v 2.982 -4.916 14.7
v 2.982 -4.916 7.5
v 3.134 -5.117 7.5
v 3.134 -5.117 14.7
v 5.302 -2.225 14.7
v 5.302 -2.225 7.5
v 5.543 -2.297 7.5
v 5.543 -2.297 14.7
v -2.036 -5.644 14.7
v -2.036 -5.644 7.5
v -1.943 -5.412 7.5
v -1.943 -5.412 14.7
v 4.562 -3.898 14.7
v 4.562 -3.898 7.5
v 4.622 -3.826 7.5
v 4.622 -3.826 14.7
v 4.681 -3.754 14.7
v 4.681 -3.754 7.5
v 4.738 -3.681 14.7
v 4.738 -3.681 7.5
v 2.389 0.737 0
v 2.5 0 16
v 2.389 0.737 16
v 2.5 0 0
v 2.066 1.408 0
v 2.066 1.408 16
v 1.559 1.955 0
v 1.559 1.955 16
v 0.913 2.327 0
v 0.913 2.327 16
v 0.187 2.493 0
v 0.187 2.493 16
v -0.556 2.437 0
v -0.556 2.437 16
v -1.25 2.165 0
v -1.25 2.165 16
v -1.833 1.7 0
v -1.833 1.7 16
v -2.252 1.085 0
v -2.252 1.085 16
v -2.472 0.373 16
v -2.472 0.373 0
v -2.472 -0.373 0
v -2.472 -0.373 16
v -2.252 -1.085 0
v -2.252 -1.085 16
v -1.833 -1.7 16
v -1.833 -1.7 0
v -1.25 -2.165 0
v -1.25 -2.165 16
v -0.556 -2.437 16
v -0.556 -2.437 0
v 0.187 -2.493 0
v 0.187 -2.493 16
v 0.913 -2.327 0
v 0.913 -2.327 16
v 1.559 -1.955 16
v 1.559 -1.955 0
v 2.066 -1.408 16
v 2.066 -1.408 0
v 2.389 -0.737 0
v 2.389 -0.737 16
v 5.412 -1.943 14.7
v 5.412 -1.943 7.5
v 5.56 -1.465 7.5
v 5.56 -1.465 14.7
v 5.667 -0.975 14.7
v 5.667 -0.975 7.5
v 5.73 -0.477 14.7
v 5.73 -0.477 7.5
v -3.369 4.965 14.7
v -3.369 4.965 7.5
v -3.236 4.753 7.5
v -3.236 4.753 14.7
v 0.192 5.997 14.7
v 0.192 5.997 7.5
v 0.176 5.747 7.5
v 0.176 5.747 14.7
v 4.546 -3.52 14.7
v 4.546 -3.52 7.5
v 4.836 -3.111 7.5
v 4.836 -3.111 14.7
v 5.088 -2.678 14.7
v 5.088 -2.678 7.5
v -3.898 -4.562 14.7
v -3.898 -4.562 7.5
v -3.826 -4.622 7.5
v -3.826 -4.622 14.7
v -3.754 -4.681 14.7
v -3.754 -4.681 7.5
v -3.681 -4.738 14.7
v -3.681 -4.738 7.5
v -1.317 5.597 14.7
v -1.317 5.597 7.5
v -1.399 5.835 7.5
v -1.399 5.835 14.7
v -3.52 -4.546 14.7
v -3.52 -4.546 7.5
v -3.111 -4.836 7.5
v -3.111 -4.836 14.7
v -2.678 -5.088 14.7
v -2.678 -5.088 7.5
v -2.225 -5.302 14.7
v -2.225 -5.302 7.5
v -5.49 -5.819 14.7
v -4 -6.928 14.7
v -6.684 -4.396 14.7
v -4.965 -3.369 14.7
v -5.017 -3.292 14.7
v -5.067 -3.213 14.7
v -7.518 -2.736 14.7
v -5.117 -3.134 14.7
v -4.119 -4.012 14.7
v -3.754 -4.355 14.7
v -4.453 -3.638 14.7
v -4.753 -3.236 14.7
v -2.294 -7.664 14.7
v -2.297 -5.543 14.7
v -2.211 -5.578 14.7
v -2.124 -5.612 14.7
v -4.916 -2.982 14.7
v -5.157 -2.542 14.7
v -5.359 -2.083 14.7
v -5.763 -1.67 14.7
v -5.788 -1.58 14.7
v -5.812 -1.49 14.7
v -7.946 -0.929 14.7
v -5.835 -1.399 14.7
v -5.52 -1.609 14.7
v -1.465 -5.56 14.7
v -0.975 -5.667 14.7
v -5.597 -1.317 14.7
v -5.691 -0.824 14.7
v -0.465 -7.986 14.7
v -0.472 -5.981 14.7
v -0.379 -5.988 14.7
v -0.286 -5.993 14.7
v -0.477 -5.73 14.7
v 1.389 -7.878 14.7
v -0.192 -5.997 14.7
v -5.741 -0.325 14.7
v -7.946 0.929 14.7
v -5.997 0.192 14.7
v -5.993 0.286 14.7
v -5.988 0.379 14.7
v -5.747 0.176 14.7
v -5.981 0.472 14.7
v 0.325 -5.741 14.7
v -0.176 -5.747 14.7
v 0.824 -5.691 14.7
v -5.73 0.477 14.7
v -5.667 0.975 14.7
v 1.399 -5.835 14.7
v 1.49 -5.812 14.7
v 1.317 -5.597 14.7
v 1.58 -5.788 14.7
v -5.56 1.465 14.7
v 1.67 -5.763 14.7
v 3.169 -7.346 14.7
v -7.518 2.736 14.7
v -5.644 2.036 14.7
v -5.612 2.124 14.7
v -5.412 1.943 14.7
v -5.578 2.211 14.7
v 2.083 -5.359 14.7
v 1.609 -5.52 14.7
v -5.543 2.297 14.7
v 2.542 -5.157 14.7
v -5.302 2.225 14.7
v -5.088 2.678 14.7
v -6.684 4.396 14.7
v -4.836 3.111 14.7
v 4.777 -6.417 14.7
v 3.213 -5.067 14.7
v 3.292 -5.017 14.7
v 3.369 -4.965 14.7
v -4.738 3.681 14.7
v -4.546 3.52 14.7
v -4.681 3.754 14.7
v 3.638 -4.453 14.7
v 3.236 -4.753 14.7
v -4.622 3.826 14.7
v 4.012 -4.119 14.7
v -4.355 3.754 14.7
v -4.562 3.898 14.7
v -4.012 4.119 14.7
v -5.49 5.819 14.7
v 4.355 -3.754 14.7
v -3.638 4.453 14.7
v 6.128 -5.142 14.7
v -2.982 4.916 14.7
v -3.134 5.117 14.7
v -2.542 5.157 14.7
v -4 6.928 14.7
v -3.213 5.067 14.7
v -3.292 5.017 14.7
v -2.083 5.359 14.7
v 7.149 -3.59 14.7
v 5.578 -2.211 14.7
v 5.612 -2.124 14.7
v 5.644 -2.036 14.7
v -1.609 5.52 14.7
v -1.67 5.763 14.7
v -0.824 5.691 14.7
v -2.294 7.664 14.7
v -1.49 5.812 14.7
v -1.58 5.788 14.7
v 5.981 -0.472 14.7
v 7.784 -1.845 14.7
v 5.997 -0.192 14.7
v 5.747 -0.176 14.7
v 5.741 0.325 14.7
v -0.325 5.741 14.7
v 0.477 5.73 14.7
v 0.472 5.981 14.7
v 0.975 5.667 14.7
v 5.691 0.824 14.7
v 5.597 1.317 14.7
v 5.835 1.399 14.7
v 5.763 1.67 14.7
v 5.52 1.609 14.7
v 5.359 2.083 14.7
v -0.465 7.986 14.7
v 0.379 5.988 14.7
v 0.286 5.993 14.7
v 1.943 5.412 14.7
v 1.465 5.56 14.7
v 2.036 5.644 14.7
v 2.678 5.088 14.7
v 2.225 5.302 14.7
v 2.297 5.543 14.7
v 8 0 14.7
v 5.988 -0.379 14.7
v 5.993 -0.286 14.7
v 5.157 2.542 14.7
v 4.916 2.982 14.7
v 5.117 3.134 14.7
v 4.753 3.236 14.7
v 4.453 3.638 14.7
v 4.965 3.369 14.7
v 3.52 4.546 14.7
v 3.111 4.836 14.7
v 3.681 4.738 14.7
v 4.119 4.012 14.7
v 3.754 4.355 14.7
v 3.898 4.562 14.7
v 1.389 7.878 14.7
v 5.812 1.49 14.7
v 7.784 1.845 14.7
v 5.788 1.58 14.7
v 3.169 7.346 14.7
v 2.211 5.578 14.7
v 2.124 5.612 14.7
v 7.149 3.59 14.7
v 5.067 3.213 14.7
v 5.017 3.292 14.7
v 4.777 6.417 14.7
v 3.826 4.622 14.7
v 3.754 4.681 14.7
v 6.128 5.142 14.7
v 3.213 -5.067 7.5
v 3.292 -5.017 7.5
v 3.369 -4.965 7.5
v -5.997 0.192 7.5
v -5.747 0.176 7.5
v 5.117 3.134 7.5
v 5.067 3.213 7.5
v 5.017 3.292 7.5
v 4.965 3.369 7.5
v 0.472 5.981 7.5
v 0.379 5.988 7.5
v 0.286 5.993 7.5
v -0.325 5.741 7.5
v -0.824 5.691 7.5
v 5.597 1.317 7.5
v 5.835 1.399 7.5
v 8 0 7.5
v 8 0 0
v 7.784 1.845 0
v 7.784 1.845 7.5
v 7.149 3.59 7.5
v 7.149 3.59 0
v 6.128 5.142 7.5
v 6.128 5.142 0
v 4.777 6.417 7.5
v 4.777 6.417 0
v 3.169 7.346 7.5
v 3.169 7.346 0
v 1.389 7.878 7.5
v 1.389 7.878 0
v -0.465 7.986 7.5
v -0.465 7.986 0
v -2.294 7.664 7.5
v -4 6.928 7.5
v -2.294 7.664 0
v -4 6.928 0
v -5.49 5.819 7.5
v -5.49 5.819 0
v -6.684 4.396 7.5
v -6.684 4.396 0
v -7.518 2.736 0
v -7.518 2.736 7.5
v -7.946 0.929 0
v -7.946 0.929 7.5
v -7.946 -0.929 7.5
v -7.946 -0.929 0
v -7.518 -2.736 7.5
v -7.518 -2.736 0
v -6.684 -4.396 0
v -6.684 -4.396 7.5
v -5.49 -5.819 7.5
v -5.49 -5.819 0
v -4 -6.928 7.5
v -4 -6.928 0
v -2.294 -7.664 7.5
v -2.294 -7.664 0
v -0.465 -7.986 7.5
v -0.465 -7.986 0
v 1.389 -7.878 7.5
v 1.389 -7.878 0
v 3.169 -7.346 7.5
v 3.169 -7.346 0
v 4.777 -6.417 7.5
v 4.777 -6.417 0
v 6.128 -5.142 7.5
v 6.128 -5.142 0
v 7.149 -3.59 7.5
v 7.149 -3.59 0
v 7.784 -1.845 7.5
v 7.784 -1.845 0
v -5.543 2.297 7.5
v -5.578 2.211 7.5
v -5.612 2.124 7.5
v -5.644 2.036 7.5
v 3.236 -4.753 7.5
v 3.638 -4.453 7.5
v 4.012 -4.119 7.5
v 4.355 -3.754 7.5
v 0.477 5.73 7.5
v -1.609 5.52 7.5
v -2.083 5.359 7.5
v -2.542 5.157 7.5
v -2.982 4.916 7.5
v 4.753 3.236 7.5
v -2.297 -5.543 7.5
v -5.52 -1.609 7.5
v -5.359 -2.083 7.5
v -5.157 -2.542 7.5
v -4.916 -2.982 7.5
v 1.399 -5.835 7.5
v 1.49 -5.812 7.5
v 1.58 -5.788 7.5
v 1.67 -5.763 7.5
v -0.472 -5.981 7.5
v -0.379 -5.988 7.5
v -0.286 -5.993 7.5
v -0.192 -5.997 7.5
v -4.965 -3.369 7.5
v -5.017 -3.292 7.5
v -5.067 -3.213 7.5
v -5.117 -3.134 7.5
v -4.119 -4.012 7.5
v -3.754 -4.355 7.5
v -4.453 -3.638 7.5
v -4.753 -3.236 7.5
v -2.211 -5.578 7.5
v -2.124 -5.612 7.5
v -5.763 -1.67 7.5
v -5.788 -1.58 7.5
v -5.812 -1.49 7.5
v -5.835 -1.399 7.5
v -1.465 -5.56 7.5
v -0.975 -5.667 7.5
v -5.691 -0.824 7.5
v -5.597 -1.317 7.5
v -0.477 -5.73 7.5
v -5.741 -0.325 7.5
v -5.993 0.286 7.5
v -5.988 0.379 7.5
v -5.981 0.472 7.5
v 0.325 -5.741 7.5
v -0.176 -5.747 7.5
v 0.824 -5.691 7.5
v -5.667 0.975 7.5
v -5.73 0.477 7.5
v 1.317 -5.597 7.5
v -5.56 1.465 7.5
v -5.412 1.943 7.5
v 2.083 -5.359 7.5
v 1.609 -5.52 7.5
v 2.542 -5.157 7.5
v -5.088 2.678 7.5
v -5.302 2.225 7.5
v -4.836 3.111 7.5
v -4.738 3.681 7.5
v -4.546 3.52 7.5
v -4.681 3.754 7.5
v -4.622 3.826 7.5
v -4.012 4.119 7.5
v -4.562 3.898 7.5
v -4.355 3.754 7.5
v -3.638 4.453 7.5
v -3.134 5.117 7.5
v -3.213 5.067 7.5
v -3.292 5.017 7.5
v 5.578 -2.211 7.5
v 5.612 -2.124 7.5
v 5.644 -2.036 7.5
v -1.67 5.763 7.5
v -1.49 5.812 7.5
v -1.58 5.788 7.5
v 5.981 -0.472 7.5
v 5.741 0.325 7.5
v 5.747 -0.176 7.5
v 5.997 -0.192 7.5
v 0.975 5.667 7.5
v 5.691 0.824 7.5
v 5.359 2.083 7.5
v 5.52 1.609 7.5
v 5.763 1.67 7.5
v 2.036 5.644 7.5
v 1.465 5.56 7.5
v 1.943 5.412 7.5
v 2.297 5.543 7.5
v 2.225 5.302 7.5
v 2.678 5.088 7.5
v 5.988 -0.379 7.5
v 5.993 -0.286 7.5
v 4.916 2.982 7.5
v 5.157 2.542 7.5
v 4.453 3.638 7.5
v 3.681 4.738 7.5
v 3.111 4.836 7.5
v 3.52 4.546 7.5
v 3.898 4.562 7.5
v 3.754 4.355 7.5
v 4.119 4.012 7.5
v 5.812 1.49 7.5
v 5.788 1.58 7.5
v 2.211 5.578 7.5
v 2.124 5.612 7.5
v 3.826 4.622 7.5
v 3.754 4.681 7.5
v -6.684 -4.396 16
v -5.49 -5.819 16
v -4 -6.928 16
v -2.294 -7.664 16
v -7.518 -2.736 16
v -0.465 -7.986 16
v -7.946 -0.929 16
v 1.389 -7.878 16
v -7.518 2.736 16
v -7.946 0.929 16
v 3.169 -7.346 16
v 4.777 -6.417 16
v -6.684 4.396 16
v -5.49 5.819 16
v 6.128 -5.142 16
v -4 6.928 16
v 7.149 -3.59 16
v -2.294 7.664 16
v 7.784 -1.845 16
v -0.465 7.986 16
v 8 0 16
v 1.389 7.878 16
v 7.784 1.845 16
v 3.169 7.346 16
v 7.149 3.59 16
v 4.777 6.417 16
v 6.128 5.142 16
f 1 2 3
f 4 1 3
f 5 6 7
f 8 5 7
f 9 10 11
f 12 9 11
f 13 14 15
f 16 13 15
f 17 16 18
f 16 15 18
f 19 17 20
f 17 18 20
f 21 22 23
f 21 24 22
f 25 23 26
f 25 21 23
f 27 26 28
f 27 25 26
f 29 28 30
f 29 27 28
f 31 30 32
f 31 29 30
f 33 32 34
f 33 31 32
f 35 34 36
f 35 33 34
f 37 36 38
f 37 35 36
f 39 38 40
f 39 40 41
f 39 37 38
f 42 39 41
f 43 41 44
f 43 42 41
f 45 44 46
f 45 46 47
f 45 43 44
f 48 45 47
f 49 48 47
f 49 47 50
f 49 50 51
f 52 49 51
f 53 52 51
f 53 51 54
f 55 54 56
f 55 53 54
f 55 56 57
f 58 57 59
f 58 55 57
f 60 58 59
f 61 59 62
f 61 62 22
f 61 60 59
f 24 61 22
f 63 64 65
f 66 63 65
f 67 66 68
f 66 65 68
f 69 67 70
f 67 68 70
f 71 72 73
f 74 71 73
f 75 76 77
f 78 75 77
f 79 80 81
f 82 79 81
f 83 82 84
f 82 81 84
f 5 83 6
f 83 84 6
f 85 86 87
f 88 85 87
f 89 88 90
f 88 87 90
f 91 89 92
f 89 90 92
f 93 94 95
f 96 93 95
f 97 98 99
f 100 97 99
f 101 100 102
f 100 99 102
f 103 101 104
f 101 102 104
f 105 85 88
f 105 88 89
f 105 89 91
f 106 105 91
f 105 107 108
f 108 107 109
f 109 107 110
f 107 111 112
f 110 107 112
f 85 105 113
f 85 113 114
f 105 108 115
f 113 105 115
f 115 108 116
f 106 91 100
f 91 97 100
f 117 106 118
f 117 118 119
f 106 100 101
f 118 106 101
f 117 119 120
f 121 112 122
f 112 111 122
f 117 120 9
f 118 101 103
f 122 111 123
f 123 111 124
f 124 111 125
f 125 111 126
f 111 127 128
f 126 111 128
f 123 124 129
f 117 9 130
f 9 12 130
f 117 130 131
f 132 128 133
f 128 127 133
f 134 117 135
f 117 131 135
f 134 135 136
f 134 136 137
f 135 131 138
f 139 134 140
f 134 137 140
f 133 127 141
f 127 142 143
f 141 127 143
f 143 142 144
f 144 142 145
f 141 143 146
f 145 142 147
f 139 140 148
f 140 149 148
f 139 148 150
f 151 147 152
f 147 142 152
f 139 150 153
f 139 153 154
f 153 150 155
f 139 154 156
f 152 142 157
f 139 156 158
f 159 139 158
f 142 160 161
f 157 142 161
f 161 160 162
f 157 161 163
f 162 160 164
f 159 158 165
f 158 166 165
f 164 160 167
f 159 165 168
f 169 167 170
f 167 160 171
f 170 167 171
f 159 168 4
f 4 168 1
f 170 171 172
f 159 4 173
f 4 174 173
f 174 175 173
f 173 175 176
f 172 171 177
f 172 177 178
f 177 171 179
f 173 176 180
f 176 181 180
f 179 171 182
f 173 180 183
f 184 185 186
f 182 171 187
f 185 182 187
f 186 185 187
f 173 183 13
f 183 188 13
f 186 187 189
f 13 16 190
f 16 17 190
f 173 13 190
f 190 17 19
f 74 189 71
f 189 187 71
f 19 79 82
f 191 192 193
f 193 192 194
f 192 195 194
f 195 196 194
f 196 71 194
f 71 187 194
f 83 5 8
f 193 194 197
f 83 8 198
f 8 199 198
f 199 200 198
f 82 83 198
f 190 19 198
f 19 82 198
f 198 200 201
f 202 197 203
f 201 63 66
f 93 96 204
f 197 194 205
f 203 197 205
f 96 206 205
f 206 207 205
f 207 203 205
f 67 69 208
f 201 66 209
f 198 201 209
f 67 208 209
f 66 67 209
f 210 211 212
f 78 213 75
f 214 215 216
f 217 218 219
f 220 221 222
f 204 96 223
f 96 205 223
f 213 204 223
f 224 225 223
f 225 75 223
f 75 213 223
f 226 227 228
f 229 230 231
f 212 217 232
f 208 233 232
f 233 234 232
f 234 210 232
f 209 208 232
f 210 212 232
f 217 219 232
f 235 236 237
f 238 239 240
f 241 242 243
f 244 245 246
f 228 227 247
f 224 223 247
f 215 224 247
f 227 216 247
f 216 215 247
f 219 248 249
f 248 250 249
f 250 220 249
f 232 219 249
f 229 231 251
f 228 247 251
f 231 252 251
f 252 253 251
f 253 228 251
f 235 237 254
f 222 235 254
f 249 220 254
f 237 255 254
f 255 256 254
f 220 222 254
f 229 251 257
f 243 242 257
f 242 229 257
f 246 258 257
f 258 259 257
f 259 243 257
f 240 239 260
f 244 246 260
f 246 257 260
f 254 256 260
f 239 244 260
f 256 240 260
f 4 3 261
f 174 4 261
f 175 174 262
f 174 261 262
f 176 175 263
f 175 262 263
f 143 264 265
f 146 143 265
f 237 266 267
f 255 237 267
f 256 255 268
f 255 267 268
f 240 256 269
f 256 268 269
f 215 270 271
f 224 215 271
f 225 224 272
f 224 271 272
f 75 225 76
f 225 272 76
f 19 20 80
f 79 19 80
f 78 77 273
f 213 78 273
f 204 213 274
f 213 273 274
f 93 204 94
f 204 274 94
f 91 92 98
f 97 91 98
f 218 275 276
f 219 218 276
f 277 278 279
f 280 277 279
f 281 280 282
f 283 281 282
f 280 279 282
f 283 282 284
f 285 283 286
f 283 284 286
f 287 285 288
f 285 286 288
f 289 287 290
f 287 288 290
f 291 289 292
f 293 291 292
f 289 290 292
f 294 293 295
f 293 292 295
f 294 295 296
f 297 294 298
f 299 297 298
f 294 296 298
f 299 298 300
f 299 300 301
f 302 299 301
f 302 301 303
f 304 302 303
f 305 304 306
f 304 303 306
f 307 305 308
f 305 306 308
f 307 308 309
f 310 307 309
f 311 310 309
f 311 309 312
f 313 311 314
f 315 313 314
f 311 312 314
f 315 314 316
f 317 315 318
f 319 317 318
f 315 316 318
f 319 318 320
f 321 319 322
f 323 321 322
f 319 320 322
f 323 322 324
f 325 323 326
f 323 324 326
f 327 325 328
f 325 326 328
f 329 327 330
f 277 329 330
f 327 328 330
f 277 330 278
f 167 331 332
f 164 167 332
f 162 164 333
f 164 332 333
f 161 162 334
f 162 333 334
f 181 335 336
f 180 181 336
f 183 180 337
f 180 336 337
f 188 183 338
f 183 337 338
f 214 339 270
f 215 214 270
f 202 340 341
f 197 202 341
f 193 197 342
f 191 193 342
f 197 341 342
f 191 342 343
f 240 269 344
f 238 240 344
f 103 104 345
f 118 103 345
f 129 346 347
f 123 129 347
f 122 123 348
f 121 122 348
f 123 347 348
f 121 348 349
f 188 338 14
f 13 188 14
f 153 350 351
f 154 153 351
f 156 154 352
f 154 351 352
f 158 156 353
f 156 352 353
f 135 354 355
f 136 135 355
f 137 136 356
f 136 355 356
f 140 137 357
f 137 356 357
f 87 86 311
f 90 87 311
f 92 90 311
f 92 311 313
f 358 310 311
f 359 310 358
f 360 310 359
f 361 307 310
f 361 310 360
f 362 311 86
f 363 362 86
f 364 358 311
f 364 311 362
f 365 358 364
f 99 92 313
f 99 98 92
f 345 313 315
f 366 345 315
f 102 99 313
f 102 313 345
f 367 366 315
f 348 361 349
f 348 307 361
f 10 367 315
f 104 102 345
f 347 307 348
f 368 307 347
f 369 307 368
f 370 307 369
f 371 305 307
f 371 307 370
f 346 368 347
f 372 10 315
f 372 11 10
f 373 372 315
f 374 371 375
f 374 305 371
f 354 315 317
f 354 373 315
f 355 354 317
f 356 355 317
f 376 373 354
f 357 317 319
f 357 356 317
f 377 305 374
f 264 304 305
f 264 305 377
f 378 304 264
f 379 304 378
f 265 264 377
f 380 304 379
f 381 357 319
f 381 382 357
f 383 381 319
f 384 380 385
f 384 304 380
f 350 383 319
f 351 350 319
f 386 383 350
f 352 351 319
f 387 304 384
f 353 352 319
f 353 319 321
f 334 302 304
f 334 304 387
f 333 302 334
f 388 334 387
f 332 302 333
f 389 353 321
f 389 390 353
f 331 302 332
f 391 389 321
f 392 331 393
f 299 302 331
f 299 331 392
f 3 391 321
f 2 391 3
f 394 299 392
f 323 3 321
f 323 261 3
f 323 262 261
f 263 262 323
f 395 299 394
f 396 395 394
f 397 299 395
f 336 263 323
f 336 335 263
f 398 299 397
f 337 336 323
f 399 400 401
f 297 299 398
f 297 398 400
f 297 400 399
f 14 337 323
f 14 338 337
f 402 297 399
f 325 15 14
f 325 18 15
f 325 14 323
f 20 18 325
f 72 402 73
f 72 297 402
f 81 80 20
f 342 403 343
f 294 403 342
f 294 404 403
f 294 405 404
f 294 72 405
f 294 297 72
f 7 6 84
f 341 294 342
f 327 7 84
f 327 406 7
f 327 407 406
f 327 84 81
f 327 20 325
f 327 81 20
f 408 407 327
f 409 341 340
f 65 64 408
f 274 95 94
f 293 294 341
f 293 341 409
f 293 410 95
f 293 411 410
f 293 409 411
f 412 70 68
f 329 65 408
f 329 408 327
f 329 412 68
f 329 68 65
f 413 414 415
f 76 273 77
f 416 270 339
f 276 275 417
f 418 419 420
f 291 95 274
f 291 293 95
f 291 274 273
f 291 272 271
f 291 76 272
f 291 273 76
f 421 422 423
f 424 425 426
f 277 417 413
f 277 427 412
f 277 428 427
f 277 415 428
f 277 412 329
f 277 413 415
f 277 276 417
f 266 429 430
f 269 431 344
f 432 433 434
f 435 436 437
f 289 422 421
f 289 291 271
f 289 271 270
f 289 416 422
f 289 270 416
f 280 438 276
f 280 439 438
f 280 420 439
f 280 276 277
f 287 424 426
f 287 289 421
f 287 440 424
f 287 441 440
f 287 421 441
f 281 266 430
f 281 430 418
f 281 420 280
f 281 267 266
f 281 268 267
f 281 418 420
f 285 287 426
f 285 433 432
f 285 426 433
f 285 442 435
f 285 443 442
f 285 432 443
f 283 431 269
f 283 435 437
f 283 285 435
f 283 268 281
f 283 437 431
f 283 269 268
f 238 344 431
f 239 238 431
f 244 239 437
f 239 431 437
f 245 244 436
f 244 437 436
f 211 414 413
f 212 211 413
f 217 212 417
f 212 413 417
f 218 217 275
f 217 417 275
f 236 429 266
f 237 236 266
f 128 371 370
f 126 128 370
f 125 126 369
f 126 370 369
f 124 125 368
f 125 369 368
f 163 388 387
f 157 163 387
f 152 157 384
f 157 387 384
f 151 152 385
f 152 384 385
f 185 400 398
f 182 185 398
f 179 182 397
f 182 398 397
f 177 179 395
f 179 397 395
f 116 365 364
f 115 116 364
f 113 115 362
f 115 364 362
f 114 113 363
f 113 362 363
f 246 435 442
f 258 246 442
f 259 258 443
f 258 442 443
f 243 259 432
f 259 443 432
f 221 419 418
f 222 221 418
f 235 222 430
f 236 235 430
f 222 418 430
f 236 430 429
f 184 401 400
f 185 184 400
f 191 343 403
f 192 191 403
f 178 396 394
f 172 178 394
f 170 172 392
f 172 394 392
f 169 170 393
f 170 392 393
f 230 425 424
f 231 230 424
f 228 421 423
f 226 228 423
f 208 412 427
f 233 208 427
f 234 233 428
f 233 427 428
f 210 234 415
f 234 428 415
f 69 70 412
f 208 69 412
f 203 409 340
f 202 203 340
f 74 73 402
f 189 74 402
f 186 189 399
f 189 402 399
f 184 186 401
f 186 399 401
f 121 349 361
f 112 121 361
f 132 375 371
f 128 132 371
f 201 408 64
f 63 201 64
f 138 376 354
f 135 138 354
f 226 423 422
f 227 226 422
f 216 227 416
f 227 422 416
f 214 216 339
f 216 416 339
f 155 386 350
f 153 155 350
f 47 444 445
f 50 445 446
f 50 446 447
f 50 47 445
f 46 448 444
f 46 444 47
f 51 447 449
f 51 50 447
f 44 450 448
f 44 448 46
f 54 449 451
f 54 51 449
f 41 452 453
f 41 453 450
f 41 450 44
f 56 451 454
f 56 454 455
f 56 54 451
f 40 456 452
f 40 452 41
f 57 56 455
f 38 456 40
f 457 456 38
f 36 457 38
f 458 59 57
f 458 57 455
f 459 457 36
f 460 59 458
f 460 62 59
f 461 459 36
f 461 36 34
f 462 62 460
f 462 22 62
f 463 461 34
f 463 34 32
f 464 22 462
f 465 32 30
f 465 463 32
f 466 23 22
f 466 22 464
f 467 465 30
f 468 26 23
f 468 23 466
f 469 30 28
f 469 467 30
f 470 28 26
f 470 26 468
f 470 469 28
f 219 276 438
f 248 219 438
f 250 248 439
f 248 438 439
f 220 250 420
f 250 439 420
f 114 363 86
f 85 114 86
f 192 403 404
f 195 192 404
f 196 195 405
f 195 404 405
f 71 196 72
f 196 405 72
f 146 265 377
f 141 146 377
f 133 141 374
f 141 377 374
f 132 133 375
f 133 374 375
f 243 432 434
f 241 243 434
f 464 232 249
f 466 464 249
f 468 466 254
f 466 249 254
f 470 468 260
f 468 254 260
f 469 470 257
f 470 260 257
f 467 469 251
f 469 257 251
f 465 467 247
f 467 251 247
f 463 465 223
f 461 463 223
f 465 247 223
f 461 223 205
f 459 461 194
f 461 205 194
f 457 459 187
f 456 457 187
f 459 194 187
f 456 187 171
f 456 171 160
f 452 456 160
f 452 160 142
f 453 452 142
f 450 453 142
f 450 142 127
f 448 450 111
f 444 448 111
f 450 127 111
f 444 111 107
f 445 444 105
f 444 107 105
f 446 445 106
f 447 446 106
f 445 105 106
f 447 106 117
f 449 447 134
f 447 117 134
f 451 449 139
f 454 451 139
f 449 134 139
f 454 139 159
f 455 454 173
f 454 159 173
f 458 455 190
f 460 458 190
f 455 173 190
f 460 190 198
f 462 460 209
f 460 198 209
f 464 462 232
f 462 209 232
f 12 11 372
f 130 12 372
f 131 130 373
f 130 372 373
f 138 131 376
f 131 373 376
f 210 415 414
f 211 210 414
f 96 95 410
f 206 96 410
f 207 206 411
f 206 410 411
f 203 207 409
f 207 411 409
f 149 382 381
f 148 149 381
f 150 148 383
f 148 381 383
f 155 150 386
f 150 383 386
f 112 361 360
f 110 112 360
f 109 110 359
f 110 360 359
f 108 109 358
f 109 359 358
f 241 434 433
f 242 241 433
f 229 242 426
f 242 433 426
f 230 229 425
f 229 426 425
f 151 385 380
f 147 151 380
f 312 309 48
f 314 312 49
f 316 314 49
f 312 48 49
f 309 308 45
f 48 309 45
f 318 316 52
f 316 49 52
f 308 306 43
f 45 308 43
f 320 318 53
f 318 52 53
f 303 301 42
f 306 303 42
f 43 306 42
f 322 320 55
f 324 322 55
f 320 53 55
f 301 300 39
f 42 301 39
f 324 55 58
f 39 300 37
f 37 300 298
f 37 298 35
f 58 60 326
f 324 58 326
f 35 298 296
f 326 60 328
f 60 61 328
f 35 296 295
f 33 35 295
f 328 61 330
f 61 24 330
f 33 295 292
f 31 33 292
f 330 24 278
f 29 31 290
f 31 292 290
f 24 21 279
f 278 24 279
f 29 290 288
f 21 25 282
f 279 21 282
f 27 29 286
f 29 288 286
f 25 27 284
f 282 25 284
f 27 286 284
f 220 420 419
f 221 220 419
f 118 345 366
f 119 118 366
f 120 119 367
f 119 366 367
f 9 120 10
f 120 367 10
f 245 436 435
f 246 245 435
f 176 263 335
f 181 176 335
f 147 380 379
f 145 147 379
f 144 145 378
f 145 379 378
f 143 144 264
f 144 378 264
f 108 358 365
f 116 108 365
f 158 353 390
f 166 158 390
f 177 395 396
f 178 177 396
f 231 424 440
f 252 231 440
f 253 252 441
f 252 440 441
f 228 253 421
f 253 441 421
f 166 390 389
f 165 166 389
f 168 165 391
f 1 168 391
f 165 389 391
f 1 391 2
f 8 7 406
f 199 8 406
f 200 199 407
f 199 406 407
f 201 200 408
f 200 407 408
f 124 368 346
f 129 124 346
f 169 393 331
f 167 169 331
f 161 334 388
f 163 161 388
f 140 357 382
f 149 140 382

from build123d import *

# Parameters (mm, degrees)
F0_R     = 8
F0_R_2   = 2.5
F1_DEPTH = 7.5
F2_R     = 2.5
F3_DEPTH = 7.2
F4_R     = 8
F4_R_2   = 2.5
F5_DEPTH = 1.3


with BuildPart() as f1:
    # F0 (on Top) → F1 (new body)
    with BuildSketch(Plane.XY):
        Circle(F0_R)
        Circle(F0_R_2, mode=Mode.SUBTRACT)
    extrude(amount=F1_DEPTH)

    # F2 (on face) → F3 (join)
    with BuildSketch(Plane.XY.offset(7.5)):
        with BuildLine():
            Line((4.9164306089, 2.9818132181), (5.1165819993, 3.1337818439))
            ThreePointArc((5.1165819993, 3.1337818439), (5.042026432, 3.2523790461), (4.964722424, 3.3692033558))
            Line((4.964722424, 3.3692033558), (4.7530401587, 3.2359093389))
            ThreePointArc((4.7530401587, 3.2359093389), (4.2903592893, 3.8282263738), (3.7543724091, 4.3551335013))
            Line((3.7543724091, 4.3551335013), (3.8977668051, 4.5615144341))
            ThreePointArc((3.8977668051, 4.5615144341), (3.790211696, 4.6512681388), (3.6805905185, 4.7384864076))
            Line((3.6805905185, 4.7384864076), (3.5204588372, 4.5463028469))
            ThreePointArc((3.5204588372, 4.5463028469), (2.8973871515, 4.966653571), (2.2248100796, 5.3021429733))
            Line((2.2248100796, 5.3021429733), (2.2974110388, 5.5427342097))
            ThreePointArc((2.2974110388, 5.5427342097), (2.1673846314, 5.5948586988), (2.0361767688, 5.6439333949))
            Line((2.0361767688, 5.6439333949), (1.9432704762, 5.4116725563))
            ThreePointArc((1.9432704762, 5.4116725563), (1.2207985721, 5.618910112), (0.4774678383, 5.730141749))
            Line((0.4774678383, 5.730141749), (0.472168673, 5.9813925422))
            ThreePointArc((0.472168673, 5.9813925422), (0.3323988579, 5.9907855077), (0.1924478502, 5.9969128579))
            Line((0.1924478502, 5.9969128579), (0.1758612615, 5.7473100505))
            ThreePointArc((0.1758612615, 5.7473100505), (-0.5752902774, 5.7211485819), (-1.3166122817, 5.597234326))
            Line((-1.3166122817, 5.597234326), (-1.3992928524, 5.834550498))
            ThreePointArc((-1.3992928524, 5.834550498), (-1.5351244317, 5.8002924908), (-1.6701192049, 5.7628727074))
            Line((-1.6701192049, 5.7628727074), (-1.6087624789, 5.5203607932))
            ThreePointArc((-1.6087624789, 5.5203607932), (-2.3150657063, 5.2633611671), (-2.9818132181, 4.9164306089))
            Line((-2.9818132181, 4.9164306089), (-3.1337818439, 5.1165819993))
            ThreePointArc((-3.1337818439, 5.1165819993), (-3.2523790461, 5.042026432), (-3.3692033558, 4.964722424))
            Line((-3.3692033558, 4.964722424), (-3.2359093389, 4.7530401587))
            ThreePointArc((-3.2359093389, 4.7530401587), (-3.8282263738, 4.2903592893), (-4.3551335013, 3.7543724091))
            Line((-4.3551335013, 3.7543724091), (-4.5615144341, 3.8977668051))
            ThreePointArc((-4.5615144341, 3.8977668051), (-4.6512681388, 3.790211696), (-4.7384864076, 3.6805905185))
            Line((-4.7384864076, 3.6805905185), (-4.5463028469, 3.5204588372))
            ThreePointArc((-4.5463028469, 3.5204588372), (-4.966653571, 2.8973871515), (-5.3021429733, 2.2248100796))
            Line((-5.3021429733, 2.2248100796), (-5.5427342097, 2.2974110388))
            ThreePointArc((-5.5427342097, 2.2974110388), (-5.5948586988, 2.1673846314), (-5.6439333949, 2.0361767688))
            Line((-5.6439333949, 2.0361767688), (-5.4116725563, 1.9432704762))
            ThreePointArc((-5.4116725563, 1.9432704762), (-5.618910112, 1.2207985721), (-5.730141749, 0.4774678383))
            Line((-5.730141749, 0.4774678383), (-5.9813925422, 0.472168673))
            ThreePointArc((-5.9813925422, 0.472168673), (-5.9907855077, 0.3323988579), (-5.9969128579, 0.1924478502))
            Line((-5.9969128579, 0.1924478502), (-5.7473100505, 0.1758612615))
            ThreePointArc((-5.7473100505, 0.1758612615), (-5.7211485819, -0.5752902774), (-5.597234326, -1.3166122817))
            Line((-5.597234326, -1.3166122817), (-5.834550498, -1.3992928524))
            ThreePointArc((-5.834550498, -1.3992928524), (-5.8002924908, -1.5351244317), (-5.7628727074, -1.6701192049))
            Line((-5.7628727074, -1.6701192049), (-5.5203607932, -1.6087624789))
            ThreePointArc((-5.5203607932, -1.6087624789), (-5.2633611671, -2.3150657063), (-4.9164306089, -2.9818132181))
            Line((-4.9164306089, -2.9818132181), (-5.1165819993, -3.1337818439))
            ThreePointArc((-5.1165819993, -3.1337818439), (-5.042026432, -3.2523790461), (-4.964722424, -3.3692033558))
            Line((-4.964722424, -3.3692033558), (-4.7530401587, -3.2359093389))
            ThreePointArc((-4.7530401587, -3.2359093389), (-4.2903592893, -3.8282263738), (-3.7543724091, -4.3551335013))
            Line((-3.7543724091, -4.3551335013), (-3.8977668051, -4.5615144341))
            ThreePointArc((-3.8977668051, -4.5615144341), (-3.790211696, -4.6512681388), (-3.6805905185, -4.7384864076))
            Line((-3.6805905185, -4.7384864076), (-3.5204588372, -4.5463028469))
            ThreePointArc((-3.5204588372, -4.5463028469), (-2.8973871515, -4.966653571), (-2.2248100796, -5.3021429733))
            Line((-2.2248100796, -5.3021429733), (-2.2974110388, -5.5427342097))
            ThreePointArc((-2.2974110388, -5.5427342097), (-2.1673846314, -5.5948586988), (-2.0361767688, -5.6439333949))
            Line((-2.0361767688, -5.6439333949), (-1.9432704762, -5.4116725563))
            ThreePointArc((-1.9432704762, -5.4116725563), (-1.2207985721, -5.618910112), (-0.4774678383, -5.730141749))
            Line((-0.4774678383, -5.730141749), (-0.472168673, -5.9813925422))
            ThreePointArc((-0.472168673, -5.9813925422), (-0.3323988579, -5.9907855077), (-0.1924478502, -5.9969128579))
            Line((-0.1924478502, -5.9969128579), (-0.1758612615, -5.7473100505))
            ThreePointArc((-0.1758612615, -5.7473100505), (0.5752902774, -5.7211485819), (1.3166122817, -5.597234326))
            Line((1.3166122817, -5.597234326), (1.3992928524, -5.834550498))
            ThreePointArc((1.3992928524, -5.834550498), (1.5351244317, -5.8002924908), (1.6701192049, -5.7628727074))
            Line((1.6701192049, -5.7628727074), (1.6087624789, -5.5203607932))
            ThreePointArc((1.6087624789, -5.5203607932), (2.3150657063, -5.2633611671), (2.9818132181, -4.9164306089))
            Line((2.9818132181, -4.9164306089), (3.1337818439, -5.1165819993))
            ThreePointArc((3.1337818439, -5.1165819993), (3.2523790461, -5.042026432), (3.3692033558, -4.964722424))
            Line((3.3692033558, -4.964722424), (3.2359093389, -4.7530401587))
            ThreePointArc((3.2359093389, -4.7530401587), (3.8282263738, -4.2903592893), (4.3551335013, -3.7543724091))
            Line((4.3551335013, -3.7543724091), (4.5615144341, -3.8977668051))
            ThreePointArc((4.5615144341, -3.8977668051), (4.6512681388, -3.790211696), (4.7384864076, -3.6805905185))
            Line((4.7384864076, -3.6805905185), (4.5463028469, -3.5204588372))
            ThreePointArc((4.5463028469, -3.5204588372), (4.966653571, -2.8973871515), (5.3021429733, -2.2248100796))
            Line((5.3021429733, -2.2248100796), (5.5427342097, -2.2974110388))
            ThreePointArc((5.5427342097, -2.2974110388), (5.5948586988, -2.1673846314), (5.6439333949, -2.0361767688))
            Line((5.6439333949, -2.0361767688), (5.4116725563, -1.9432704762))
            ThreePointArc((5.4116725563, -1.9432704762), (5.618910112, -1.2207985721), (5.730141749, -0.4774678383))
            Line((5.730141749, -0.4774678383), (5.9813925422, -0.472168673))
            ThreePointArc((5.9813925422, -0.472168673), (5.9907855077, -0.3323988579), (5.9969128579, -0.1924478502))
            Line((5.9969128579, -0.1924478502), (5.7473100505, -0.1758612615))
            ThreePointArc((5.7473100505, -0.1758612615), (5.7211485819, 0.5752902774), (5.597234326, 1.3166122817))
            Line((5.597234326, 1.3166122817), (5.834550498, 1.3992928524))
            ThreePointArc((5.834550498, 1.3992928524), (5.8002924908, 1.5351244317), (5.7628727074, 1.6701192049))
            Line((5.7628727074, 1.6701192049), (5.5203607932, 1.6087624789))
            ThreePointArc((5.5203607932, 1.6087624789), (5.2633611671, 2.3150657063), (4.9164306089, 2.9818132181))
        make_face()
        Circle(F2_R, mode=Mode.SUBTRACT)
    extrude(amount=F3_DEPTH)

    # F4 (on face) → F5 (join)
    with BuildSketch(Plane.XY.offset(14.7)):
        Circle(F4_R)
        with BuildLine():
            ThreePointArc((-3.7543724091, -4.3551335013), (-4.2903592893, -3.8282263738), (-4.7530401587, -3.2359093389))
            Line((-4.7530401587, -3.2359093389), (-4.964722424, -3.3692033558))
            ThreePointArc((-4.964722424, -3.3692033558), (-5.042026432, -3.2523790461), (-5.1165819993, -3.1337818439))
            Line((-5.1165819993, -3.1337818439), (-4.9164306089, -2.9818132181))
            ThreePointArc((-4.9164306089, -2.9818132181), (-5.2633611671, -2.3150657063), (-5.5203607932, -1.6087624789))
            Line((-5.5203607932, -1.6087624789), (-5.7628727074, -1.6701192049))
            ThreePointArc((-5.7628727074, -1.6701192049), (-5.8002924908, -1.5351244317), (-5.834550498, -1.3992928524))
            Line((-5.834550498, -1.3992928524), (-5.597234326, -1.3166122817))
            ThreePointArc((-5.597234326, -1.3166122817), (-5.7211485819, -0.5752902774), (-5.7473100505, 0.1758612615))
            Line((-5.7473100505, 0.1758612615), (-5.9969128579, 0.1924478502))
            ThreePointArc((-5.9969128579, 0.1924478502), (-5.9907855077, 0.3323988579), (-5.9813925422, 0.472168673))
            Line((-5.9813925422, 0.472168673), (-5.730141749, 0.4774678383))
            ThreePointArc((-5.730141749, 0.4774678383), (-5.618910112, 1.2207985721), (-5.4116725563, 1.9432704762))
            Line((-5.4116725563, 1.9432704762), (-5.6439333949, 2.0361767688))
            ThreePointArc((-5.6439333949, 2.0361767688), (-5.5948586988, 2.1673846314), (-5.5427342097, 2.2974110388))
            Line((-5.5427342097, 2.2974110388), (-5.3021429733, 2.2248100796))
            ThreePointArc((-5.3021429733, 2.2248100796), (-4.966653571, 2.8973871515), (-4.5463028469, 3.5204588372))
            Line((-4.5463028469, 3.5204588372), (-4.7384864076, 3.6805905185))
            ThreePointArc((-4.7384864076, 3.6805905185), (-4.6512681388, 3.790211696), (-4.5615144341, 3.8977668051))
            Line((-4.5615144341, 3.8977668051), (-4.3551335013, 3.7543724091))
            ThreePointArc((-4.3551335013, 3.7543724091), (-3.8282263738, 4.2903592893), (-3.2359093389, 4.7530401587))
            Line((-3.2359093389, 4.7530401587), (-3.3692033558, 4.964722424))
            ThreePointArc((-3.3692033558, 4.964722424), (-3.2523790461, 5.042026432), (-3.1337818439, 5.1165819993))
            Line((-3.1337818439, 5.1165819993), (-2.9818132181, 4.9164306089))
            ThreePointArc((-2.9818132181, 4.9164306089), (-2.3150657063, 5.2633611671), (-1.6087624789, 5.5203607932))
            Line((-1.6087624789, 5.5203607932), (-1.6701192049, 5.7628727074))
            ThreePointArc((-1.6701192049, 5.7628727074), (-1.5351244317, 5.8002924908), (-1.3992928524, 5.834550498))
            Line((-1.3992928524, 5.834550498), (-1.3166122817, 5.597234326))
            ThreePointArc((-1.3166122817, 5.597234326), (-0.5752902774, 5.7211485819), (0.1758612615, 5.7473100505))
            Line((0.1758612615, 5.7473100505), (0.1924478502, 5.9969128579))
            ThreePointArc((0.1924478502, 5.9969128579), (0.3323988579, 5.9907855077), (0.472168673, 5.9813925422))
            Line((0.472168673, 5.9813925422), (0.4774678383, 5.730141749))
            ThreePointArc((0.4774678383, 5.730141749), (1.2207985721, 5.618910112), (1.9432704762, 5.4116725563))
            Line((1.9432704762, 5.4116725563), (2.0361767688, 5.6439333949))
            ThreePointArc((2.0361767688, 5.6439333949), (2.1673846314, 5.5948586988), (2.2974110388, 5.5427342097))
            Line((2.2974110388, 5.5427342097), (2.2248100796, 5.3021429733))
            ThreePointArc((2.2248100796, 5.3021429733), (2.8973871515, 4.966653571), (3.5204588372, 4.5463028469))
            Line((3.5204588372, 4.5463028469), (3.6805905185, 4.7384864076))
            ThreePointArc((3.6805905185, 4.7384864076), (3.790211696, 4.6512681388), (3.8977668051, 4.5615144341))
            Line((3.8977668051, 4.5615144341), (3.7543724091, 4.3551335013))
            ThreePointArc((3.7543724091, 4.3551335013), (4.2903592893, 3.8282263738), (4.7530401587, 3.2359093389))
            Line((4.7530401587, 3.2359093389), (4.964722424, 3.3692033558))
            ThreePointArc((4.964722424, 3.3692033558), (5.042026432, 3.2523790461), (5.1165819993, 3.1337818439))
            Line((5.1165819993, 3.1337818439), (4.9164306089, 2.9818132181))
            ThreePointArc((4.9164306089, 2.9818132181), (5.2633611671, 2.3150657063), (5.5203607932, 1.6087624789))
            Line((5.5203607932, 1.6087624789), (5.7628727074, 1.6701192049))
            ThreePointArc((5.7628727074, 1.6701192049), (5.8002924908, 1.5351244317), (5.834550498, 1.3992928524))
            Line((5.834550498, 1.3992928524), (5.597234326, 1.3166122817))
            ThreePointArc((5.597234326, 1.3166122817), (5.7211485819, 0.5752902774), (5.7473100505, -0.1758612615))
            Line((5.7473100505, -0.1758612615), (5.9969128579, -0.1924478502))
            ThreePointArc((5.9969128579, -0.1924478502), (5.9907855077, -0.3323988579), (5.9813925422, -0.472168673))
            Line((5.9813925422, -0.472168673), (5.730141749, -0.4774678383))
            ThreePointArc((5.730141749, -0.4774678383), (5.618910112, -1.2207985721), (5.4116725563, -1.9432704762))
            Line((5.4116725563, -1.9432704762), (5.6439333949, -2.0361767688))
            ThreePointArc((5.6439333949, -2.0361767688), (5.5948586988, -2.1673846314), (5.5427342097, -2.2974110388))
            Line((5.5427342097, -2.2974110388), (5.3021429733, -2.2248100796))
            ThreePointArc((5.3021429733, -2.2248100796), (4.966653571, -2.8973871515), (4.5463028469, -3.5204588372))
            Line((4.5463028469, -3.5204588372), (4.7384864076, -3.6805905185))
            ThreePointArc((4.7384864076, -3.6805905185), (4.6512681388, -3.790211696), (4.5615144341, -3.8977668051))
            Line((4.5615144341, -3.8977668051), (4.3551335013, -3.7543724091))
            ThreePointArc((4.3551335013, -3.7543724091), (3.8282263738, -4.2903592893), (3.2359093389, -4.7530401587))
            Line((3.2359093389, -4.7530401587), (3.3692033558, -4.964722424))
            ThreePointArc((3.3692033558, -4.964722424), (3.2523790461, -5.042026432), (3.1337818439, -5.1165819993))
            Line((3.1337818439, -5.1165819993), (2.9818132181, -4.9164306089))
            ThreePointArc((2.9818132181, -4.9164306089), (2.3150657063, -5.2633611671), (1.6087624789, -5.5203607932))
            Line((1.6087624789, -5.5203607932), (1.6701192049, -5.7628727074))
            ThreePointArc((1.6701192049, -5.7628727074), (1.5351244317, -5.8002924908), (1.3992928524, -5.834550498))
            Line((1.3992928524, -5.834550498), (1.3166122817, -5.597234326))
            ThreePointArc((1.3166122817, -5.597234326), (0.5752902774, -5.7211485819), (-0.1758612615, -5.7473100505))
            Line((-0.1758612615, -5.7473100505), (-0.1924478502, -5.9969128579))
            ThreePointArc((-0.1924478502, -5.9969128579), (-0.3323988579, -5.9907855077), (-0.472168673, -5.9813925422))
            Line((-0.472168673, -5.9813925422), (-0.4774678383, -5.730141749))
            ThreePointArc((-0.4774678383, -5.730141749), (-1.2207985721, -5.618910112), (-1.9432704762, -5.4116725563))
            Line((-1.9432704762, -5.4116725563), (-2.0361767688, -5.6439333949))
            ThreePointArc((-2.0361767688, -5.6439333949), (-2.1673846314, -5.5948586988), (-2.2974110388, -5.5427342097))
            Line((-2.2974110388, -5.5427342097), (-2.2248100796, -5.3021429733))
            ThreePointArc((-2.2248100796, -5.3021429733), (-2.8973871515, -4.966653571), (-3.5204588372, -4.5463028469))
            Line((-3.5204588372, -4.5463028469), (-3.6805905185, -4.7384864076))
            ThreePointArc((-3.6805905185, -4.7384864076), (-3.790211696, -4.6512681388), (-3.8977668051, -4.5615144341))
            Line((-3.8977668051, -4.5615144341), (-3.7543724091, -4.3551335013))
        make_face(mode=Mode.SUBTRACT)
        with BuildLine():
            Line((-4.964722424, -3.3692033558), (-4.7530401587, -3.2359093389))
            ThreePointArc((-4.7530401587, -3.2359093389), (-4.2903592893, -3.8282263738), (-3.7543724091, -4.3551335013))
            Line((-3.7543724091, -4.3551335013), (-3.8977668051, -4.5615144341))
            ThreePointArc((-3.8977668051, -4.5615144341), (-3.790211696, -4.6512681388), (-3.6805905185, -4.7384864076))
            Line((-3.6805905185, -4.7384864076), (-3.5204588372, -4.5463028469))
            ThreePointArc((-3.5204588372, -4.5463028469), (-2.8973871515, -4.966653571), (-2.2248100796, -5.3021429733))
            Line((-2.2248100796, -5.3021429733), (-2.2974110388, -5.5427342097))
            ThreePointArc((-2.2974110388, -5.5427342097), (-2.1673846314, -5.5948586988), (-2.0361767688, -5.6439333949))
            Line((-2.0361767688, -5.6439333949), (-1.9432704762, -5.4116725563))
            ThreePointArc((-1.9432704762, -5.4116725563), (-1.2207985721, -5.618910112), (-0.4774678383, -5.730141749))
            Line((-0.4774678383, -5.730141749), (-0.472168673, -5.9813925422))
            ThreePointArc((-0.472168673, -5.9813925422), (-0.3323988579, -5.9907855077), (-0.1924478502, -5.9969128579))
            Line((-0.1924478502, -5.9969128579), (-0.1758612615, -5.7473100505))
            ThreePointArc((-0.1758612615, -5.7473100505), (0.5752902774, -5.7211485819), (1.3166122817, -5.597234326))
            Line((1.3166122817, -5.597234326), (1.3992928524, -5.834550498))
            ThreePointArc((1.3992928524, -5.834550498), (1.5351244317, -5.8002924908), (1.6701192049, -5.7628727074))
            Line((1.6701192049, -5.7628727074), (1.6087624789, -5.5203607932))
            ThreePointArc((1.6087624789, -5.5203607932), (2.3150657063, -5.2633611671), (2.9818132181, -4.9164306089))
            Line((2.9818132181, -4.9164306089), (3.1337818439, -5.1165819993))
            ThreePointArc((3.1337818439, -5.1165819993), (3.2523790461, -5.042026432), (3.3692033558, -4.964722424))
            Line((3.3692033558, -4.964722424), (3.2359093389, -4.7530401587))
            ThreePointArc((3.2359093389, -4.7530401587), (3.8282263738, -4.2903592893), (4.3551335013, -3.7543724091))
            Line((4.3551335013, -3.7543724091), (4.5615144341, -3.8977668051))
            ThreePointArc((4.5615144341, -3.8977668051), (4.6512681388, -3.790211696), (4.7384864076, -3.6805905185))
            Line((4.7384864076, -3.6805905185), (4.5463028469, -3.5204588372))
            ThreePointArc((4.5463028469, -3.5204588372), (4.966653571, -2.8973871515), (5.3021429733, -2.2248100796))
            Line((5.3021429733, -2.2248100796), (5.5427342097, -2.2974110388))
            ThreePointArc((5.5427342097, -2.2974110388), (5.5948586988, -2.1673846314), (5.6439333949, -2.0361767688))
            Line((5.6439333949, -2.0361767688), (5.4116725563, -1.9432704762))
            ThreePointArc((5.4116725563, -1.9432704762), (5.618910112, -1.2207985721), (5.730141749, -0.4774678383))
            Line((5.730141749, -0.4774678383), (5.9813925422, -0.472168673))
            ThreePointArc((5.9813925422, -0.472168673), (5.9907855077, -0.3323988579), (5.9969128579, -0.1924478502))
            Line((5.9969128579, -0.1924478502), (5.7473100505, -0.1758612615))
            ThreePointArc((5.7473100505, -0.1758612615), (5.7211485819, 0.5752902774), (5.597234326, 1.3166122817))
            Line((5.597234326, 1.3166122817), (5.834550498, 1.3992928524))
            ThreePointArc((5.834550498, 1.3992928524), (5.8002924908, 1.5351244317), (5.7628727074, 1.6701192049))
            Line((5.7628727074, 1.6701192049), (5.5203607932, 1.6087624789))
            ThreePointArc((5.5203607932, 1.6087624789), (5.2633611671, 2.3150657063), (4.9164306089, 2.9818132181))
            Line((4.9164306089, 2.9818132181), (5.1165819993, 3.1337818439))
            ThreePointArc((5.1165819993, 3.1337818439), (5.042026432, 3.2523790461), (4.964722424, 3.3692033558))
            Line((4.964722424, 3.3692033558), (4.7530401587, 3.2359093389))
            ThreePointArc((4.7530401587, 3.2359093389), (4.2903592893, 3.8282263738), (3.7543724091, 4.3551335013))
            Line((3.7543724091, 4.3551335013), (3.8977668051, 4.5615144341))
            ThreePointArc((3.8977668051, 4.5615144341), (3.790211696, 4.6512681388), (3.6805905185, 4.7384864076))
            Line((3.6805905185, 4.7384864076), (3.5204588372, 4.5463028469))
            ThreePointArc((3.5204588372, 4.5463028469), (2.8973871515, 4.966653571), (2.2248100796, 5.3021429733))
            Line((2.2248100796, 5.3021429733), (2.2974110388, 5.5427342097))
            ThreePointArc((2.2974110388, 5.5427342097), (2.1673846314, 5.5948586988), (2.0361767688, 5.6439333949))
            Line((2.0361767688, 5.6439333949), (1.9432704762, 5.4116725563))
            ThreePointArc((1.9432704762, 5.4116725563), (1.2207985721, 5.618910112), (0.4774678383, 5.730141749))
            Line((0.4774678383, 5.730141749), (0.472168673, 5.9813925422))
            ThreePointArc((0.472168673, 5.9813925422), (0.3323988579, 5.9907855077), (0.1924478502, 5.9969128579))
            Line((0.1924478502, 5.9969128579), (0.1758612615, 5.7473100505))
            ThreePointArc((0.1758612615, 5.7473100505), (-0.5752902774, 5.7211485819), (-1.3166122817, 5.597234326))
            Line((-1.3166122817, 5.597234326), (-1.3992928524, 5.834550498))
            ThreePointArc((-1.3992928524, 5.834550498), (-1.5351244317, 5.8002924908), (-1.6701192049, 5.7628727074))
            Line((-1.6701192049, 5.7628727074), (-1.6087624789, 5.5203607932))
            ThreePointArc((-1.6087624789, 5.5203607932), (-2.3150657063, 5.2633611671), (-2.9818132181, 4.9164306089))
            Line((-2.9818132181, 4.9164306089), (-3.1337818439, 5.1165819993))
            ThreePointArc((-3.1337818439, 5.1165819993), (-3.2523790461, 5.042026432), (-3.3692033558, 4.964722424))
            Line((-3.3692033558, 4.964722424), (-3.2359093389, 4.7530401587))
            ThreePointArc((-3.2359093389, 4.7530401587), (-3.8282263738, 4.2903592893), (-4.3551335013, 3.7543724091))
            Line((-4.3551335013, 3.7543724091), (-4.5615144341, 3.8977668051))
            ThreePointArc((-4.5615144341, 3.8977668051), (-4.6512681388, 3.790211696), (-4.7384864076, 3.6805905185))
            Line((-4.7384864076, 3.6805905185), (-4.5463028469, 3.5204588372))
            ThreePointArc((-4.5463028469, 3.5204588372), (-4.966653571, 2.8973871515), (-5.3021429733, 2.2248100796))
            Line((-5.3021429733, 2.2248100796), (-5.5427342097, 2.2974110388))
            ThreePointArc((-5.5427342097, 2.2974110388), (-5.5948586988, 2.1673846314), (-5.6439333949, 2.0361767688))
            Line((-5.6439333949, 2.0361767688), (-5.4116725563, 1.9432704762))
            ThreePointArc((-5.4116725563, 1.9432704762), (-5.618910112, 1.2207985721), (-5.730141749, 0.4774678383))
            Line((-5.730141749, 0.4774678383), (-5.9813925422, 0.472168673))
            ThreePointArc((-5.9813925422, 0.472168673), (-5.9907855077, 0.3323988579), (-5.9969128579, 0.1924478502))
            Line((-5.9969128579, 0.1924478502), (-5.7473100505, 0.1758612615))
            ThreePointArc((-5.7473100505, 0.1758612615), (-5.7211485819, -0.5752902774), (-5.597234326, -1.3166122817))
            Line((-5.597234326, -1.3166122817), (-5.834550498, -1.3992928524))
            ThreePointArc((-5.834550498, -1.3992928524), (-5.8002924908, -1.5351244317), (-5.7628727074, -1.6701192049))
            Line((-5.7628727074, -1.6701192049), (-5.5203607932, -1.6087624789))
            ThreePointArc((-5.5203607932, -1.6087624789), (-5.2633611671, -2.3150657063), (-4.9164306089, -2.9818132181))
            Line((-4.9164306089, -2.9818132181), (-5.1165819993, -3.1337818439))
            ThreePointArc((-5.1165819993, -3.1337818439), (-5.042026432, -3.2523790461), (-4.964722424, -3.3692033558))
        make_face()
        Circle(F4_R_2, mode=Mode.SUBTRACT)
    extrude(amount=F5_DEPTH)


solid = f1.part
